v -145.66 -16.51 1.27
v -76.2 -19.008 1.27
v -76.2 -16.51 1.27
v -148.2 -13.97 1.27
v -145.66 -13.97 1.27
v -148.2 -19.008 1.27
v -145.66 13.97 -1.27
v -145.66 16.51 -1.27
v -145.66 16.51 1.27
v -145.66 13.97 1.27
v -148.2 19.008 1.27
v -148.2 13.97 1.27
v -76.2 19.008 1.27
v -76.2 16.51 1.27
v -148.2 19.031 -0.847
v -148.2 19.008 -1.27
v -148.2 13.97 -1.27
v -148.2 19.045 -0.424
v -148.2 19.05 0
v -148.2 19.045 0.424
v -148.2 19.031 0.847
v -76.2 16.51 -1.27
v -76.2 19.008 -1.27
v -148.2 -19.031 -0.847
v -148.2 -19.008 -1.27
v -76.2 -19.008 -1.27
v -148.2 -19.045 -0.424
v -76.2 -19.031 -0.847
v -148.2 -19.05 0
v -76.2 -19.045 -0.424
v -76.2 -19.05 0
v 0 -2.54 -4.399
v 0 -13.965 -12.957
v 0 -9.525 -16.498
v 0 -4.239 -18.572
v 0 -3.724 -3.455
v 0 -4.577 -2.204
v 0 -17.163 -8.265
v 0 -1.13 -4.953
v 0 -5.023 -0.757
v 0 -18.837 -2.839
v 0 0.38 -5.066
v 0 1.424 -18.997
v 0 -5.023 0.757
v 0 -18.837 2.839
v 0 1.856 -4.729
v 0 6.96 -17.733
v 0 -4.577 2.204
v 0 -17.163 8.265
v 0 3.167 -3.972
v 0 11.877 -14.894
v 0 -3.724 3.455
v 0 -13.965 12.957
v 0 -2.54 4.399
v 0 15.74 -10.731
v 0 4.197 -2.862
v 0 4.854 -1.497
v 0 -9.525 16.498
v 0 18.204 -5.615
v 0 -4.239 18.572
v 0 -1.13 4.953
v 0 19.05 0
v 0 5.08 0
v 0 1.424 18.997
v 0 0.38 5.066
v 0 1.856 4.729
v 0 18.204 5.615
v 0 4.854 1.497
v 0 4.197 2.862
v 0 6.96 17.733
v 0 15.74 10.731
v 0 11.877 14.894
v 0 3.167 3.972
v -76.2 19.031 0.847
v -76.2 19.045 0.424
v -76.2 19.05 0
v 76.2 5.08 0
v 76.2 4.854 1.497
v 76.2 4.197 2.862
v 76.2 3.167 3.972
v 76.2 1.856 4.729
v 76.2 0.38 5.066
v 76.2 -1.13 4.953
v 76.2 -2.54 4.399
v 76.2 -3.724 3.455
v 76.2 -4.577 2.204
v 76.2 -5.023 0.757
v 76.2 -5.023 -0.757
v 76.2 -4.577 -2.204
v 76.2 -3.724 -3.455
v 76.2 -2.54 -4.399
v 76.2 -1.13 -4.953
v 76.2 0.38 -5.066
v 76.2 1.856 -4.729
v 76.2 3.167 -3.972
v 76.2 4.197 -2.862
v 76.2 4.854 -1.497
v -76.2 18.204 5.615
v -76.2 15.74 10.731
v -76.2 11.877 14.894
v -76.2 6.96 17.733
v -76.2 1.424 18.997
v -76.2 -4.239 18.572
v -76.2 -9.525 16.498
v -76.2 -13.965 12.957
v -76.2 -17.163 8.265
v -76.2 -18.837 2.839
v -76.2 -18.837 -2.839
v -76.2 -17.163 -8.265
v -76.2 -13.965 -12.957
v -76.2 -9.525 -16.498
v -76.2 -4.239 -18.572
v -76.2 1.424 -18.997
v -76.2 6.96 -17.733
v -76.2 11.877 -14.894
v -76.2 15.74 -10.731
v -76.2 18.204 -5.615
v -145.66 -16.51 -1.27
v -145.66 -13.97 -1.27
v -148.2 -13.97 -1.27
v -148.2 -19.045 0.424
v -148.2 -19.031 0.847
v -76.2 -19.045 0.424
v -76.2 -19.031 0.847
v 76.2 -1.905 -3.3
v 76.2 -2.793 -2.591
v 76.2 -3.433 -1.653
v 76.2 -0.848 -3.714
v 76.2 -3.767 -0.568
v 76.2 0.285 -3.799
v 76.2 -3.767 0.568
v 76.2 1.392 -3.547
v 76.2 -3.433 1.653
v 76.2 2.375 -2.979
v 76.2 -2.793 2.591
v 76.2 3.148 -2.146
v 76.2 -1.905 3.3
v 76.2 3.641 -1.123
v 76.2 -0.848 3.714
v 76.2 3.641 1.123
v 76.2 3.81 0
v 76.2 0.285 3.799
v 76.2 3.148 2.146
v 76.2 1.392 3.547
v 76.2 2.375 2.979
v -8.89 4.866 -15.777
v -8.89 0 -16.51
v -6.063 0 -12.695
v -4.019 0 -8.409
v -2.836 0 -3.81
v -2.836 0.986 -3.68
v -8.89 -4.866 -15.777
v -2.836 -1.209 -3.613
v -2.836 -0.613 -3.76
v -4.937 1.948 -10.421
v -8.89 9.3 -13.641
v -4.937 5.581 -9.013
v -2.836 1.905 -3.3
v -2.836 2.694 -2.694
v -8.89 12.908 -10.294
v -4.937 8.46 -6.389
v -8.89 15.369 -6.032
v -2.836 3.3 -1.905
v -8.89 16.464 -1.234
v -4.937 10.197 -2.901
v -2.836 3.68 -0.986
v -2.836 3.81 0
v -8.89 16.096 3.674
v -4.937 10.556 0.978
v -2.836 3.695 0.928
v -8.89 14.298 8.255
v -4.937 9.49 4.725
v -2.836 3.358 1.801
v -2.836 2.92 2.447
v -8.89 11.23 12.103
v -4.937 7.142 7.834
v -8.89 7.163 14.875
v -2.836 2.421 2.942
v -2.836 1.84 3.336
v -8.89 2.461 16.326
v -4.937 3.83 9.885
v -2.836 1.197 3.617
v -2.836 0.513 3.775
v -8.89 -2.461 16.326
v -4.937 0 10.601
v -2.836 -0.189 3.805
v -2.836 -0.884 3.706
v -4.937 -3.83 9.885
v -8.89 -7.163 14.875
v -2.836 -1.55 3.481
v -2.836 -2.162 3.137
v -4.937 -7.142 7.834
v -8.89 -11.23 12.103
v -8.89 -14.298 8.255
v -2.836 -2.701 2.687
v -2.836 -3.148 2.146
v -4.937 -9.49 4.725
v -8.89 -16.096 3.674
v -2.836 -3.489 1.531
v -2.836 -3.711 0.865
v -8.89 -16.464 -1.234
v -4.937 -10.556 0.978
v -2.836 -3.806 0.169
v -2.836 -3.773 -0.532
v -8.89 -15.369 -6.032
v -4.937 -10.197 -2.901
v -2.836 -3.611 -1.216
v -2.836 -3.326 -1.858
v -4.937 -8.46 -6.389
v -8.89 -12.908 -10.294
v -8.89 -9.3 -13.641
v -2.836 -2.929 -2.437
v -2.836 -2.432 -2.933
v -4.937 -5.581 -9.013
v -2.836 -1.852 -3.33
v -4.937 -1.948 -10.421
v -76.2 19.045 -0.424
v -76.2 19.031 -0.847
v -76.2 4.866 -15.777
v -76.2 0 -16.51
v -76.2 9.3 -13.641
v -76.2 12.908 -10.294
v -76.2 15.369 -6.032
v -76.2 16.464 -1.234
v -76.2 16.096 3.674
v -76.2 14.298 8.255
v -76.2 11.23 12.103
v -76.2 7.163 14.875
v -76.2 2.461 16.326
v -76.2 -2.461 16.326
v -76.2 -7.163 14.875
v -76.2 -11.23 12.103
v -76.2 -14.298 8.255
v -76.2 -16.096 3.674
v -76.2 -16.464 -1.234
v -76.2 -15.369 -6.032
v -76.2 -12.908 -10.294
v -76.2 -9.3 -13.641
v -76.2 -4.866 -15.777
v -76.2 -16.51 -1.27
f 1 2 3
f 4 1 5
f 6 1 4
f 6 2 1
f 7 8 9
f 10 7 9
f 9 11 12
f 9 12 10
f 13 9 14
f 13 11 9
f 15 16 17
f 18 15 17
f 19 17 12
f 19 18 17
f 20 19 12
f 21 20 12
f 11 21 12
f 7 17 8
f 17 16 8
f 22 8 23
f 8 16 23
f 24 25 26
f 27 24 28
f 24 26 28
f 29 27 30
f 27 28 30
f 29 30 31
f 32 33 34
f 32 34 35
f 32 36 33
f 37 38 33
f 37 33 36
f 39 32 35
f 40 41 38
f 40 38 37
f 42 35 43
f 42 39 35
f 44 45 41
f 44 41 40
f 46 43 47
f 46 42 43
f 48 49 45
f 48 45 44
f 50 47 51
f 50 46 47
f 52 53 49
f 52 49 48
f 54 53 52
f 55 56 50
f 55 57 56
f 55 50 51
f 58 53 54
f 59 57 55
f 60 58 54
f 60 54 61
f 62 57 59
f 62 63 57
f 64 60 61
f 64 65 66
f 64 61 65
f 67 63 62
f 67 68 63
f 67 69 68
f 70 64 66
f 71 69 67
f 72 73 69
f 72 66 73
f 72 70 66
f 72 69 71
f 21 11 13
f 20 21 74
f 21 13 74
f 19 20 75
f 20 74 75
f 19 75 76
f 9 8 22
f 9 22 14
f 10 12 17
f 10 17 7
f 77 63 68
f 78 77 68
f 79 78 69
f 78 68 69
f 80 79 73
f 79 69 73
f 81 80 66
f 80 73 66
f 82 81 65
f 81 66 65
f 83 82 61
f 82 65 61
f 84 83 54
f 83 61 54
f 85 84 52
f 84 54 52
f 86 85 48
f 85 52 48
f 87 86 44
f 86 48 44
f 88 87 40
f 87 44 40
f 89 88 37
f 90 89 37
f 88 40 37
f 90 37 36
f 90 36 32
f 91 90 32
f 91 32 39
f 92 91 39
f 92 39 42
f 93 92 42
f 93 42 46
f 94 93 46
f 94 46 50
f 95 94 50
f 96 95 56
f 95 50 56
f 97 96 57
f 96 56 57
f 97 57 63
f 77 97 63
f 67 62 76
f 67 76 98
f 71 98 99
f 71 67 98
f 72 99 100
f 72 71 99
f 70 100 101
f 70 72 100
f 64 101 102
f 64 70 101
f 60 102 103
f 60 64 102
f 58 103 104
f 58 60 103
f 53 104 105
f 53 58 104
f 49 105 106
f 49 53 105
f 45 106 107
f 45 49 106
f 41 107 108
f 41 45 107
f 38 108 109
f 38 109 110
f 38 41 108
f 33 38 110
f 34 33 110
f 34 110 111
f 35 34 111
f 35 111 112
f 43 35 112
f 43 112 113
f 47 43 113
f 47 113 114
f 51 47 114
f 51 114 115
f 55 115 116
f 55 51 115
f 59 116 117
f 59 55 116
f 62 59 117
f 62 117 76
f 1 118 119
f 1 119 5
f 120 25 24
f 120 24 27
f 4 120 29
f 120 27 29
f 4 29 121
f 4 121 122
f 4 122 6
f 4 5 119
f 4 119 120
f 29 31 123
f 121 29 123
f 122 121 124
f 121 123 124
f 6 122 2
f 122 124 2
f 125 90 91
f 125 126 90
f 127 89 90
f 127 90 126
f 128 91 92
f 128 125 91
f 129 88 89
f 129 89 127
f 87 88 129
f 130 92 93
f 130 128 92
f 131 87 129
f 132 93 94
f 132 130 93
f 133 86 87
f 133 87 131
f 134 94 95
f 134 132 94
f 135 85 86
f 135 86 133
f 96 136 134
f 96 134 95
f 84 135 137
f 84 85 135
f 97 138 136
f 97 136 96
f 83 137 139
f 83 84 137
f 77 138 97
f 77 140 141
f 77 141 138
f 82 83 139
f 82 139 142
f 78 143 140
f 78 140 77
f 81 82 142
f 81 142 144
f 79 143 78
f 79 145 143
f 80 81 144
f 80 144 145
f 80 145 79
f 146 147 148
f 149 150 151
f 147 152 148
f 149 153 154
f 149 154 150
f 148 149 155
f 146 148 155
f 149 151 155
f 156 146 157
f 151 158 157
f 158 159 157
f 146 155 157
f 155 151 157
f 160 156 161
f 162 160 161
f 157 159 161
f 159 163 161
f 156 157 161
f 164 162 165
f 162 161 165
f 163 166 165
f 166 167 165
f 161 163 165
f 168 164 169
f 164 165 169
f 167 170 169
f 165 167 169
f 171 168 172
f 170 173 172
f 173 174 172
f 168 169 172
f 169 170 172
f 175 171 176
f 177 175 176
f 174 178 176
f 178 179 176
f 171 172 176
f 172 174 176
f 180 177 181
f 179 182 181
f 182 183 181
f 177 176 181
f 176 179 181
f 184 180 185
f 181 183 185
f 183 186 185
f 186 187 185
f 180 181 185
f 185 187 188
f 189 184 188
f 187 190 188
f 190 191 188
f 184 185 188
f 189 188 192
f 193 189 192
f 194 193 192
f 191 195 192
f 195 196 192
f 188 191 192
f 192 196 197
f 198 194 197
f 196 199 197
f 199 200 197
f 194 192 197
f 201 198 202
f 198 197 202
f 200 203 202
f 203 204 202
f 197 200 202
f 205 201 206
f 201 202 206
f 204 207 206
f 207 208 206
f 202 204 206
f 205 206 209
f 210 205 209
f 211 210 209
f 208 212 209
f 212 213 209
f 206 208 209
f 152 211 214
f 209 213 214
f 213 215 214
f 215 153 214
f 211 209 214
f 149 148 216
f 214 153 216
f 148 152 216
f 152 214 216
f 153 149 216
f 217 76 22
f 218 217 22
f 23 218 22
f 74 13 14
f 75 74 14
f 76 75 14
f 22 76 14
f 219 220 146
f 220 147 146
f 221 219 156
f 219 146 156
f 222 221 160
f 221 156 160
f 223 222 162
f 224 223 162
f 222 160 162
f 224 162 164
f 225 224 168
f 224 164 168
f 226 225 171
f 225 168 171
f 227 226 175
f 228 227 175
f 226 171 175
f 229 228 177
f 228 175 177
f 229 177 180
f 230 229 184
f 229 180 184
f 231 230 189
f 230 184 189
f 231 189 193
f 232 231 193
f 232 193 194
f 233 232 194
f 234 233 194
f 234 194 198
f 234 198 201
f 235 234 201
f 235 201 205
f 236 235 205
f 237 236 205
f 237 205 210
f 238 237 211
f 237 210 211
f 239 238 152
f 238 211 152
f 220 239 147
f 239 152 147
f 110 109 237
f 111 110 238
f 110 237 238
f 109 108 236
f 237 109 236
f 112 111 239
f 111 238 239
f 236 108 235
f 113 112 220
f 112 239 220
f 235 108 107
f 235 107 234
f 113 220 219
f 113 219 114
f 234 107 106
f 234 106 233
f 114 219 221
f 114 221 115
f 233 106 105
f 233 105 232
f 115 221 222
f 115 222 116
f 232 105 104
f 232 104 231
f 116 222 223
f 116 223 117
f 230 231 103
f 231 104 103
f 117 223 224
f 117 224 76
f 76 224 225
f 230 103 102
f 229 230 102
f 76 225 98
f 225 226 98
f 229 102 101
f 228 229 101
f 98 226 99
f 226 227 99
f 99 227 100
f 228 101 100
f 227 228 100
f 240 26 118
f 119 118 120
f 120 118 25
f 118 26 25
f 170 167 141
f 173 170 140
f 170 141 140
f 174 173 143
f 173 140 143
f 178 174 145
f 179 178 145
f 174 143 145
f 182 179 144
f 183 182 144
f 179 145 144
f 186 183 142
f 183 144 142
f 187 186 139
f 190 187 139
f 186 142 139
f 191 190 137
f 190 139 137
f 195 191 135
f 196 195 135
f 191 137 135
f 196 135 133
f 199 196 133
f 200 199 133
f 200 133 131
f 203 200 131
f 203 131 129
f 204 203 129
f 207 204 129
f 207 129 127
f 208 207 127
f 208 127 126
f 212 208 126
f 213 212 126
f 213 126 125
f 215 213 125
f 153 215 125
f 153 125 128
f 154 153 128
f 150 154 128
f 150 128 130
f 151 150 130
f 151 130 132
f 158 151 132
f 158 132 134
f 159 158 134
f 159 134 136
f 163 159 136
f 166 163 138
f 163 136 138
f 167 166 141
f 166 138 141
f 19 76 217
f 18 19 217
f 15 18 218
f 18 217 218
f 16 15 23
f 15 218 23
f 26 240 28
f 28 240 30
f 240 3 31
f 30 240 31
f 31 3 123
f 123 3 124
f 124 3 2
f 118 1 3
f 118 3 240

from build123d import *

# Parameters (mm, degrees)
F0_R      = 19.05
F1_DEPTH  = 76.2
F2_R      = 5.08
F3_DEPTH  = 76.2
F4_R      = 3.81
F5_DEPTH  = 88.9
F6_W      = 67.31
F6_H      = 16.51
F9_DEPTH  = 72
F10_W     = 2.54
F10_H     = 2.54
F11_DEPTH = 2.54
F12_W     = 2.54
F12_H     = 2.54
F13_DEPTH = 2.54


with BuildPart() as f1:
    # F0 (on Right) → F1 (new body)
    with BuildSketch(Plane.YZ):
        Circle(F0_R)
    extrude(amount=-F1_DEPTH)

    # F2 (on face) → F3 (join)
    with BuildSketch(Plane.YZ):
        Circle(F2_R)
    extrude(amount=F3_DEPTH)

    # F4 (on face) → F5 (cut)
    with BuildSketch(Plane.YZ.offset(76.2)):
        Circle(F4_R)
    extrude(amount=-F5_DEPTH, mode=Mode.SUBTRACT)

    # F6 (on Front) → F7 (revolve, cut)
    with BuildSketch(Plane.XZ):
        with Locations((-42.545, -8.255)):
            Rectangle(F6_W, F6_H)
        with BuildLine():
            Line((-2.54, 0), (-8.89, 0))
            Line((-8.89, 0), (-8.89, -16.51))
            ThreePointArc((-8.89, -16.51), (-4.1822309544, -8.844526556), (-2.54, 0))
        make_face()
    revolve(axis=Axis((-39.37, 0, 0), (1, 0, 0)), mode=Mode.SUBTRACT)


with BuildPart() as f9:
    # F8 (on face) → F9 (new body)
    with BuildSketch(Plane(origin=(-76.2, 0, 0), x_dir=(0, -1, 0), z_dir=(-1, 0, 0))):
        with BuildLine():
            Line((-16.51, 1.27), (-19.0076195248, 1.27))
            ThreePointArc((-19.0076195248, 1.27), (-19.0394019332, 0.6353534655), (-19.05, 0))
            Line((-19.05, 0), (-16.51, 0))
            Line((-16.51, 0), (-16.51, 1.27))
        make_face()
        with BuildLine():
            ThreePointArc((-19.05, 0), (-19.0394019332, -0.6353534655), (-19.0076195248, -1.27))
            Line((-19.0076195248, -1.27), (-16.51, -1.27))
            Line((-16.51, -1.27), (-16.51, 0))
            Line((-16.51, 0), (-19.05, 0))
        make_face()
    extrude(amount=F9_DEPTH)

    # F12 (on face) → F13 (join)
    with BuildSketch(Plane.XZ.offset(-16.51)):
        with Locations((-146.93, 0)):
            Rectangle(F12_W, F12_H)
    extrude(amount=F13_DEPTH)


with BuildPart() as f9b:
    # F8 (on face) → F9, piece 2 (new body)
    with BuildSketch(Plane(origin=(-76.2, 0, 0), x_dir=(0, -1, 0), z_dir=(-1, 0, 0))):
        with BuildLine():
            Line((16.51, 0), (19.05, 0))
            ThreePointArc((19.05, 0), (19.0394019332, 0.6353534655), (19.0076195248, 1.27))
            Line((19.0076195248, 1.27), (16.51, 1.27))
            Line((16.51, 1.27), (16.51, 0))
        make_face()
        with BuildLine():
            ThreePointArc((19.0076195248, -1.27), (19.0394019332, -0.6353534655), (19.05, 0))
            Line((19.05, 0), (16.51, 0))
            Line((16.51, 0), (16.51, -1.27))
            Line((16.51, -1.27), (19.0076195248, -1.27))
        make_face()
    extrude(amount=F9_DEPTH)

    # F10 (on face) → F11 (join)
    with BuildSketch(Plane(origin=(0, -16.51, 0), x_dir=(-1, 0, 0), z_dir=(0, 1, 0))):
        with Locations((146.93, 0)):
            Rectangle(F10_W, F10_H)
    extrude(amount=F11_DEPTH)


solid = Compound([f1.part, f9.part, f9b.part])
